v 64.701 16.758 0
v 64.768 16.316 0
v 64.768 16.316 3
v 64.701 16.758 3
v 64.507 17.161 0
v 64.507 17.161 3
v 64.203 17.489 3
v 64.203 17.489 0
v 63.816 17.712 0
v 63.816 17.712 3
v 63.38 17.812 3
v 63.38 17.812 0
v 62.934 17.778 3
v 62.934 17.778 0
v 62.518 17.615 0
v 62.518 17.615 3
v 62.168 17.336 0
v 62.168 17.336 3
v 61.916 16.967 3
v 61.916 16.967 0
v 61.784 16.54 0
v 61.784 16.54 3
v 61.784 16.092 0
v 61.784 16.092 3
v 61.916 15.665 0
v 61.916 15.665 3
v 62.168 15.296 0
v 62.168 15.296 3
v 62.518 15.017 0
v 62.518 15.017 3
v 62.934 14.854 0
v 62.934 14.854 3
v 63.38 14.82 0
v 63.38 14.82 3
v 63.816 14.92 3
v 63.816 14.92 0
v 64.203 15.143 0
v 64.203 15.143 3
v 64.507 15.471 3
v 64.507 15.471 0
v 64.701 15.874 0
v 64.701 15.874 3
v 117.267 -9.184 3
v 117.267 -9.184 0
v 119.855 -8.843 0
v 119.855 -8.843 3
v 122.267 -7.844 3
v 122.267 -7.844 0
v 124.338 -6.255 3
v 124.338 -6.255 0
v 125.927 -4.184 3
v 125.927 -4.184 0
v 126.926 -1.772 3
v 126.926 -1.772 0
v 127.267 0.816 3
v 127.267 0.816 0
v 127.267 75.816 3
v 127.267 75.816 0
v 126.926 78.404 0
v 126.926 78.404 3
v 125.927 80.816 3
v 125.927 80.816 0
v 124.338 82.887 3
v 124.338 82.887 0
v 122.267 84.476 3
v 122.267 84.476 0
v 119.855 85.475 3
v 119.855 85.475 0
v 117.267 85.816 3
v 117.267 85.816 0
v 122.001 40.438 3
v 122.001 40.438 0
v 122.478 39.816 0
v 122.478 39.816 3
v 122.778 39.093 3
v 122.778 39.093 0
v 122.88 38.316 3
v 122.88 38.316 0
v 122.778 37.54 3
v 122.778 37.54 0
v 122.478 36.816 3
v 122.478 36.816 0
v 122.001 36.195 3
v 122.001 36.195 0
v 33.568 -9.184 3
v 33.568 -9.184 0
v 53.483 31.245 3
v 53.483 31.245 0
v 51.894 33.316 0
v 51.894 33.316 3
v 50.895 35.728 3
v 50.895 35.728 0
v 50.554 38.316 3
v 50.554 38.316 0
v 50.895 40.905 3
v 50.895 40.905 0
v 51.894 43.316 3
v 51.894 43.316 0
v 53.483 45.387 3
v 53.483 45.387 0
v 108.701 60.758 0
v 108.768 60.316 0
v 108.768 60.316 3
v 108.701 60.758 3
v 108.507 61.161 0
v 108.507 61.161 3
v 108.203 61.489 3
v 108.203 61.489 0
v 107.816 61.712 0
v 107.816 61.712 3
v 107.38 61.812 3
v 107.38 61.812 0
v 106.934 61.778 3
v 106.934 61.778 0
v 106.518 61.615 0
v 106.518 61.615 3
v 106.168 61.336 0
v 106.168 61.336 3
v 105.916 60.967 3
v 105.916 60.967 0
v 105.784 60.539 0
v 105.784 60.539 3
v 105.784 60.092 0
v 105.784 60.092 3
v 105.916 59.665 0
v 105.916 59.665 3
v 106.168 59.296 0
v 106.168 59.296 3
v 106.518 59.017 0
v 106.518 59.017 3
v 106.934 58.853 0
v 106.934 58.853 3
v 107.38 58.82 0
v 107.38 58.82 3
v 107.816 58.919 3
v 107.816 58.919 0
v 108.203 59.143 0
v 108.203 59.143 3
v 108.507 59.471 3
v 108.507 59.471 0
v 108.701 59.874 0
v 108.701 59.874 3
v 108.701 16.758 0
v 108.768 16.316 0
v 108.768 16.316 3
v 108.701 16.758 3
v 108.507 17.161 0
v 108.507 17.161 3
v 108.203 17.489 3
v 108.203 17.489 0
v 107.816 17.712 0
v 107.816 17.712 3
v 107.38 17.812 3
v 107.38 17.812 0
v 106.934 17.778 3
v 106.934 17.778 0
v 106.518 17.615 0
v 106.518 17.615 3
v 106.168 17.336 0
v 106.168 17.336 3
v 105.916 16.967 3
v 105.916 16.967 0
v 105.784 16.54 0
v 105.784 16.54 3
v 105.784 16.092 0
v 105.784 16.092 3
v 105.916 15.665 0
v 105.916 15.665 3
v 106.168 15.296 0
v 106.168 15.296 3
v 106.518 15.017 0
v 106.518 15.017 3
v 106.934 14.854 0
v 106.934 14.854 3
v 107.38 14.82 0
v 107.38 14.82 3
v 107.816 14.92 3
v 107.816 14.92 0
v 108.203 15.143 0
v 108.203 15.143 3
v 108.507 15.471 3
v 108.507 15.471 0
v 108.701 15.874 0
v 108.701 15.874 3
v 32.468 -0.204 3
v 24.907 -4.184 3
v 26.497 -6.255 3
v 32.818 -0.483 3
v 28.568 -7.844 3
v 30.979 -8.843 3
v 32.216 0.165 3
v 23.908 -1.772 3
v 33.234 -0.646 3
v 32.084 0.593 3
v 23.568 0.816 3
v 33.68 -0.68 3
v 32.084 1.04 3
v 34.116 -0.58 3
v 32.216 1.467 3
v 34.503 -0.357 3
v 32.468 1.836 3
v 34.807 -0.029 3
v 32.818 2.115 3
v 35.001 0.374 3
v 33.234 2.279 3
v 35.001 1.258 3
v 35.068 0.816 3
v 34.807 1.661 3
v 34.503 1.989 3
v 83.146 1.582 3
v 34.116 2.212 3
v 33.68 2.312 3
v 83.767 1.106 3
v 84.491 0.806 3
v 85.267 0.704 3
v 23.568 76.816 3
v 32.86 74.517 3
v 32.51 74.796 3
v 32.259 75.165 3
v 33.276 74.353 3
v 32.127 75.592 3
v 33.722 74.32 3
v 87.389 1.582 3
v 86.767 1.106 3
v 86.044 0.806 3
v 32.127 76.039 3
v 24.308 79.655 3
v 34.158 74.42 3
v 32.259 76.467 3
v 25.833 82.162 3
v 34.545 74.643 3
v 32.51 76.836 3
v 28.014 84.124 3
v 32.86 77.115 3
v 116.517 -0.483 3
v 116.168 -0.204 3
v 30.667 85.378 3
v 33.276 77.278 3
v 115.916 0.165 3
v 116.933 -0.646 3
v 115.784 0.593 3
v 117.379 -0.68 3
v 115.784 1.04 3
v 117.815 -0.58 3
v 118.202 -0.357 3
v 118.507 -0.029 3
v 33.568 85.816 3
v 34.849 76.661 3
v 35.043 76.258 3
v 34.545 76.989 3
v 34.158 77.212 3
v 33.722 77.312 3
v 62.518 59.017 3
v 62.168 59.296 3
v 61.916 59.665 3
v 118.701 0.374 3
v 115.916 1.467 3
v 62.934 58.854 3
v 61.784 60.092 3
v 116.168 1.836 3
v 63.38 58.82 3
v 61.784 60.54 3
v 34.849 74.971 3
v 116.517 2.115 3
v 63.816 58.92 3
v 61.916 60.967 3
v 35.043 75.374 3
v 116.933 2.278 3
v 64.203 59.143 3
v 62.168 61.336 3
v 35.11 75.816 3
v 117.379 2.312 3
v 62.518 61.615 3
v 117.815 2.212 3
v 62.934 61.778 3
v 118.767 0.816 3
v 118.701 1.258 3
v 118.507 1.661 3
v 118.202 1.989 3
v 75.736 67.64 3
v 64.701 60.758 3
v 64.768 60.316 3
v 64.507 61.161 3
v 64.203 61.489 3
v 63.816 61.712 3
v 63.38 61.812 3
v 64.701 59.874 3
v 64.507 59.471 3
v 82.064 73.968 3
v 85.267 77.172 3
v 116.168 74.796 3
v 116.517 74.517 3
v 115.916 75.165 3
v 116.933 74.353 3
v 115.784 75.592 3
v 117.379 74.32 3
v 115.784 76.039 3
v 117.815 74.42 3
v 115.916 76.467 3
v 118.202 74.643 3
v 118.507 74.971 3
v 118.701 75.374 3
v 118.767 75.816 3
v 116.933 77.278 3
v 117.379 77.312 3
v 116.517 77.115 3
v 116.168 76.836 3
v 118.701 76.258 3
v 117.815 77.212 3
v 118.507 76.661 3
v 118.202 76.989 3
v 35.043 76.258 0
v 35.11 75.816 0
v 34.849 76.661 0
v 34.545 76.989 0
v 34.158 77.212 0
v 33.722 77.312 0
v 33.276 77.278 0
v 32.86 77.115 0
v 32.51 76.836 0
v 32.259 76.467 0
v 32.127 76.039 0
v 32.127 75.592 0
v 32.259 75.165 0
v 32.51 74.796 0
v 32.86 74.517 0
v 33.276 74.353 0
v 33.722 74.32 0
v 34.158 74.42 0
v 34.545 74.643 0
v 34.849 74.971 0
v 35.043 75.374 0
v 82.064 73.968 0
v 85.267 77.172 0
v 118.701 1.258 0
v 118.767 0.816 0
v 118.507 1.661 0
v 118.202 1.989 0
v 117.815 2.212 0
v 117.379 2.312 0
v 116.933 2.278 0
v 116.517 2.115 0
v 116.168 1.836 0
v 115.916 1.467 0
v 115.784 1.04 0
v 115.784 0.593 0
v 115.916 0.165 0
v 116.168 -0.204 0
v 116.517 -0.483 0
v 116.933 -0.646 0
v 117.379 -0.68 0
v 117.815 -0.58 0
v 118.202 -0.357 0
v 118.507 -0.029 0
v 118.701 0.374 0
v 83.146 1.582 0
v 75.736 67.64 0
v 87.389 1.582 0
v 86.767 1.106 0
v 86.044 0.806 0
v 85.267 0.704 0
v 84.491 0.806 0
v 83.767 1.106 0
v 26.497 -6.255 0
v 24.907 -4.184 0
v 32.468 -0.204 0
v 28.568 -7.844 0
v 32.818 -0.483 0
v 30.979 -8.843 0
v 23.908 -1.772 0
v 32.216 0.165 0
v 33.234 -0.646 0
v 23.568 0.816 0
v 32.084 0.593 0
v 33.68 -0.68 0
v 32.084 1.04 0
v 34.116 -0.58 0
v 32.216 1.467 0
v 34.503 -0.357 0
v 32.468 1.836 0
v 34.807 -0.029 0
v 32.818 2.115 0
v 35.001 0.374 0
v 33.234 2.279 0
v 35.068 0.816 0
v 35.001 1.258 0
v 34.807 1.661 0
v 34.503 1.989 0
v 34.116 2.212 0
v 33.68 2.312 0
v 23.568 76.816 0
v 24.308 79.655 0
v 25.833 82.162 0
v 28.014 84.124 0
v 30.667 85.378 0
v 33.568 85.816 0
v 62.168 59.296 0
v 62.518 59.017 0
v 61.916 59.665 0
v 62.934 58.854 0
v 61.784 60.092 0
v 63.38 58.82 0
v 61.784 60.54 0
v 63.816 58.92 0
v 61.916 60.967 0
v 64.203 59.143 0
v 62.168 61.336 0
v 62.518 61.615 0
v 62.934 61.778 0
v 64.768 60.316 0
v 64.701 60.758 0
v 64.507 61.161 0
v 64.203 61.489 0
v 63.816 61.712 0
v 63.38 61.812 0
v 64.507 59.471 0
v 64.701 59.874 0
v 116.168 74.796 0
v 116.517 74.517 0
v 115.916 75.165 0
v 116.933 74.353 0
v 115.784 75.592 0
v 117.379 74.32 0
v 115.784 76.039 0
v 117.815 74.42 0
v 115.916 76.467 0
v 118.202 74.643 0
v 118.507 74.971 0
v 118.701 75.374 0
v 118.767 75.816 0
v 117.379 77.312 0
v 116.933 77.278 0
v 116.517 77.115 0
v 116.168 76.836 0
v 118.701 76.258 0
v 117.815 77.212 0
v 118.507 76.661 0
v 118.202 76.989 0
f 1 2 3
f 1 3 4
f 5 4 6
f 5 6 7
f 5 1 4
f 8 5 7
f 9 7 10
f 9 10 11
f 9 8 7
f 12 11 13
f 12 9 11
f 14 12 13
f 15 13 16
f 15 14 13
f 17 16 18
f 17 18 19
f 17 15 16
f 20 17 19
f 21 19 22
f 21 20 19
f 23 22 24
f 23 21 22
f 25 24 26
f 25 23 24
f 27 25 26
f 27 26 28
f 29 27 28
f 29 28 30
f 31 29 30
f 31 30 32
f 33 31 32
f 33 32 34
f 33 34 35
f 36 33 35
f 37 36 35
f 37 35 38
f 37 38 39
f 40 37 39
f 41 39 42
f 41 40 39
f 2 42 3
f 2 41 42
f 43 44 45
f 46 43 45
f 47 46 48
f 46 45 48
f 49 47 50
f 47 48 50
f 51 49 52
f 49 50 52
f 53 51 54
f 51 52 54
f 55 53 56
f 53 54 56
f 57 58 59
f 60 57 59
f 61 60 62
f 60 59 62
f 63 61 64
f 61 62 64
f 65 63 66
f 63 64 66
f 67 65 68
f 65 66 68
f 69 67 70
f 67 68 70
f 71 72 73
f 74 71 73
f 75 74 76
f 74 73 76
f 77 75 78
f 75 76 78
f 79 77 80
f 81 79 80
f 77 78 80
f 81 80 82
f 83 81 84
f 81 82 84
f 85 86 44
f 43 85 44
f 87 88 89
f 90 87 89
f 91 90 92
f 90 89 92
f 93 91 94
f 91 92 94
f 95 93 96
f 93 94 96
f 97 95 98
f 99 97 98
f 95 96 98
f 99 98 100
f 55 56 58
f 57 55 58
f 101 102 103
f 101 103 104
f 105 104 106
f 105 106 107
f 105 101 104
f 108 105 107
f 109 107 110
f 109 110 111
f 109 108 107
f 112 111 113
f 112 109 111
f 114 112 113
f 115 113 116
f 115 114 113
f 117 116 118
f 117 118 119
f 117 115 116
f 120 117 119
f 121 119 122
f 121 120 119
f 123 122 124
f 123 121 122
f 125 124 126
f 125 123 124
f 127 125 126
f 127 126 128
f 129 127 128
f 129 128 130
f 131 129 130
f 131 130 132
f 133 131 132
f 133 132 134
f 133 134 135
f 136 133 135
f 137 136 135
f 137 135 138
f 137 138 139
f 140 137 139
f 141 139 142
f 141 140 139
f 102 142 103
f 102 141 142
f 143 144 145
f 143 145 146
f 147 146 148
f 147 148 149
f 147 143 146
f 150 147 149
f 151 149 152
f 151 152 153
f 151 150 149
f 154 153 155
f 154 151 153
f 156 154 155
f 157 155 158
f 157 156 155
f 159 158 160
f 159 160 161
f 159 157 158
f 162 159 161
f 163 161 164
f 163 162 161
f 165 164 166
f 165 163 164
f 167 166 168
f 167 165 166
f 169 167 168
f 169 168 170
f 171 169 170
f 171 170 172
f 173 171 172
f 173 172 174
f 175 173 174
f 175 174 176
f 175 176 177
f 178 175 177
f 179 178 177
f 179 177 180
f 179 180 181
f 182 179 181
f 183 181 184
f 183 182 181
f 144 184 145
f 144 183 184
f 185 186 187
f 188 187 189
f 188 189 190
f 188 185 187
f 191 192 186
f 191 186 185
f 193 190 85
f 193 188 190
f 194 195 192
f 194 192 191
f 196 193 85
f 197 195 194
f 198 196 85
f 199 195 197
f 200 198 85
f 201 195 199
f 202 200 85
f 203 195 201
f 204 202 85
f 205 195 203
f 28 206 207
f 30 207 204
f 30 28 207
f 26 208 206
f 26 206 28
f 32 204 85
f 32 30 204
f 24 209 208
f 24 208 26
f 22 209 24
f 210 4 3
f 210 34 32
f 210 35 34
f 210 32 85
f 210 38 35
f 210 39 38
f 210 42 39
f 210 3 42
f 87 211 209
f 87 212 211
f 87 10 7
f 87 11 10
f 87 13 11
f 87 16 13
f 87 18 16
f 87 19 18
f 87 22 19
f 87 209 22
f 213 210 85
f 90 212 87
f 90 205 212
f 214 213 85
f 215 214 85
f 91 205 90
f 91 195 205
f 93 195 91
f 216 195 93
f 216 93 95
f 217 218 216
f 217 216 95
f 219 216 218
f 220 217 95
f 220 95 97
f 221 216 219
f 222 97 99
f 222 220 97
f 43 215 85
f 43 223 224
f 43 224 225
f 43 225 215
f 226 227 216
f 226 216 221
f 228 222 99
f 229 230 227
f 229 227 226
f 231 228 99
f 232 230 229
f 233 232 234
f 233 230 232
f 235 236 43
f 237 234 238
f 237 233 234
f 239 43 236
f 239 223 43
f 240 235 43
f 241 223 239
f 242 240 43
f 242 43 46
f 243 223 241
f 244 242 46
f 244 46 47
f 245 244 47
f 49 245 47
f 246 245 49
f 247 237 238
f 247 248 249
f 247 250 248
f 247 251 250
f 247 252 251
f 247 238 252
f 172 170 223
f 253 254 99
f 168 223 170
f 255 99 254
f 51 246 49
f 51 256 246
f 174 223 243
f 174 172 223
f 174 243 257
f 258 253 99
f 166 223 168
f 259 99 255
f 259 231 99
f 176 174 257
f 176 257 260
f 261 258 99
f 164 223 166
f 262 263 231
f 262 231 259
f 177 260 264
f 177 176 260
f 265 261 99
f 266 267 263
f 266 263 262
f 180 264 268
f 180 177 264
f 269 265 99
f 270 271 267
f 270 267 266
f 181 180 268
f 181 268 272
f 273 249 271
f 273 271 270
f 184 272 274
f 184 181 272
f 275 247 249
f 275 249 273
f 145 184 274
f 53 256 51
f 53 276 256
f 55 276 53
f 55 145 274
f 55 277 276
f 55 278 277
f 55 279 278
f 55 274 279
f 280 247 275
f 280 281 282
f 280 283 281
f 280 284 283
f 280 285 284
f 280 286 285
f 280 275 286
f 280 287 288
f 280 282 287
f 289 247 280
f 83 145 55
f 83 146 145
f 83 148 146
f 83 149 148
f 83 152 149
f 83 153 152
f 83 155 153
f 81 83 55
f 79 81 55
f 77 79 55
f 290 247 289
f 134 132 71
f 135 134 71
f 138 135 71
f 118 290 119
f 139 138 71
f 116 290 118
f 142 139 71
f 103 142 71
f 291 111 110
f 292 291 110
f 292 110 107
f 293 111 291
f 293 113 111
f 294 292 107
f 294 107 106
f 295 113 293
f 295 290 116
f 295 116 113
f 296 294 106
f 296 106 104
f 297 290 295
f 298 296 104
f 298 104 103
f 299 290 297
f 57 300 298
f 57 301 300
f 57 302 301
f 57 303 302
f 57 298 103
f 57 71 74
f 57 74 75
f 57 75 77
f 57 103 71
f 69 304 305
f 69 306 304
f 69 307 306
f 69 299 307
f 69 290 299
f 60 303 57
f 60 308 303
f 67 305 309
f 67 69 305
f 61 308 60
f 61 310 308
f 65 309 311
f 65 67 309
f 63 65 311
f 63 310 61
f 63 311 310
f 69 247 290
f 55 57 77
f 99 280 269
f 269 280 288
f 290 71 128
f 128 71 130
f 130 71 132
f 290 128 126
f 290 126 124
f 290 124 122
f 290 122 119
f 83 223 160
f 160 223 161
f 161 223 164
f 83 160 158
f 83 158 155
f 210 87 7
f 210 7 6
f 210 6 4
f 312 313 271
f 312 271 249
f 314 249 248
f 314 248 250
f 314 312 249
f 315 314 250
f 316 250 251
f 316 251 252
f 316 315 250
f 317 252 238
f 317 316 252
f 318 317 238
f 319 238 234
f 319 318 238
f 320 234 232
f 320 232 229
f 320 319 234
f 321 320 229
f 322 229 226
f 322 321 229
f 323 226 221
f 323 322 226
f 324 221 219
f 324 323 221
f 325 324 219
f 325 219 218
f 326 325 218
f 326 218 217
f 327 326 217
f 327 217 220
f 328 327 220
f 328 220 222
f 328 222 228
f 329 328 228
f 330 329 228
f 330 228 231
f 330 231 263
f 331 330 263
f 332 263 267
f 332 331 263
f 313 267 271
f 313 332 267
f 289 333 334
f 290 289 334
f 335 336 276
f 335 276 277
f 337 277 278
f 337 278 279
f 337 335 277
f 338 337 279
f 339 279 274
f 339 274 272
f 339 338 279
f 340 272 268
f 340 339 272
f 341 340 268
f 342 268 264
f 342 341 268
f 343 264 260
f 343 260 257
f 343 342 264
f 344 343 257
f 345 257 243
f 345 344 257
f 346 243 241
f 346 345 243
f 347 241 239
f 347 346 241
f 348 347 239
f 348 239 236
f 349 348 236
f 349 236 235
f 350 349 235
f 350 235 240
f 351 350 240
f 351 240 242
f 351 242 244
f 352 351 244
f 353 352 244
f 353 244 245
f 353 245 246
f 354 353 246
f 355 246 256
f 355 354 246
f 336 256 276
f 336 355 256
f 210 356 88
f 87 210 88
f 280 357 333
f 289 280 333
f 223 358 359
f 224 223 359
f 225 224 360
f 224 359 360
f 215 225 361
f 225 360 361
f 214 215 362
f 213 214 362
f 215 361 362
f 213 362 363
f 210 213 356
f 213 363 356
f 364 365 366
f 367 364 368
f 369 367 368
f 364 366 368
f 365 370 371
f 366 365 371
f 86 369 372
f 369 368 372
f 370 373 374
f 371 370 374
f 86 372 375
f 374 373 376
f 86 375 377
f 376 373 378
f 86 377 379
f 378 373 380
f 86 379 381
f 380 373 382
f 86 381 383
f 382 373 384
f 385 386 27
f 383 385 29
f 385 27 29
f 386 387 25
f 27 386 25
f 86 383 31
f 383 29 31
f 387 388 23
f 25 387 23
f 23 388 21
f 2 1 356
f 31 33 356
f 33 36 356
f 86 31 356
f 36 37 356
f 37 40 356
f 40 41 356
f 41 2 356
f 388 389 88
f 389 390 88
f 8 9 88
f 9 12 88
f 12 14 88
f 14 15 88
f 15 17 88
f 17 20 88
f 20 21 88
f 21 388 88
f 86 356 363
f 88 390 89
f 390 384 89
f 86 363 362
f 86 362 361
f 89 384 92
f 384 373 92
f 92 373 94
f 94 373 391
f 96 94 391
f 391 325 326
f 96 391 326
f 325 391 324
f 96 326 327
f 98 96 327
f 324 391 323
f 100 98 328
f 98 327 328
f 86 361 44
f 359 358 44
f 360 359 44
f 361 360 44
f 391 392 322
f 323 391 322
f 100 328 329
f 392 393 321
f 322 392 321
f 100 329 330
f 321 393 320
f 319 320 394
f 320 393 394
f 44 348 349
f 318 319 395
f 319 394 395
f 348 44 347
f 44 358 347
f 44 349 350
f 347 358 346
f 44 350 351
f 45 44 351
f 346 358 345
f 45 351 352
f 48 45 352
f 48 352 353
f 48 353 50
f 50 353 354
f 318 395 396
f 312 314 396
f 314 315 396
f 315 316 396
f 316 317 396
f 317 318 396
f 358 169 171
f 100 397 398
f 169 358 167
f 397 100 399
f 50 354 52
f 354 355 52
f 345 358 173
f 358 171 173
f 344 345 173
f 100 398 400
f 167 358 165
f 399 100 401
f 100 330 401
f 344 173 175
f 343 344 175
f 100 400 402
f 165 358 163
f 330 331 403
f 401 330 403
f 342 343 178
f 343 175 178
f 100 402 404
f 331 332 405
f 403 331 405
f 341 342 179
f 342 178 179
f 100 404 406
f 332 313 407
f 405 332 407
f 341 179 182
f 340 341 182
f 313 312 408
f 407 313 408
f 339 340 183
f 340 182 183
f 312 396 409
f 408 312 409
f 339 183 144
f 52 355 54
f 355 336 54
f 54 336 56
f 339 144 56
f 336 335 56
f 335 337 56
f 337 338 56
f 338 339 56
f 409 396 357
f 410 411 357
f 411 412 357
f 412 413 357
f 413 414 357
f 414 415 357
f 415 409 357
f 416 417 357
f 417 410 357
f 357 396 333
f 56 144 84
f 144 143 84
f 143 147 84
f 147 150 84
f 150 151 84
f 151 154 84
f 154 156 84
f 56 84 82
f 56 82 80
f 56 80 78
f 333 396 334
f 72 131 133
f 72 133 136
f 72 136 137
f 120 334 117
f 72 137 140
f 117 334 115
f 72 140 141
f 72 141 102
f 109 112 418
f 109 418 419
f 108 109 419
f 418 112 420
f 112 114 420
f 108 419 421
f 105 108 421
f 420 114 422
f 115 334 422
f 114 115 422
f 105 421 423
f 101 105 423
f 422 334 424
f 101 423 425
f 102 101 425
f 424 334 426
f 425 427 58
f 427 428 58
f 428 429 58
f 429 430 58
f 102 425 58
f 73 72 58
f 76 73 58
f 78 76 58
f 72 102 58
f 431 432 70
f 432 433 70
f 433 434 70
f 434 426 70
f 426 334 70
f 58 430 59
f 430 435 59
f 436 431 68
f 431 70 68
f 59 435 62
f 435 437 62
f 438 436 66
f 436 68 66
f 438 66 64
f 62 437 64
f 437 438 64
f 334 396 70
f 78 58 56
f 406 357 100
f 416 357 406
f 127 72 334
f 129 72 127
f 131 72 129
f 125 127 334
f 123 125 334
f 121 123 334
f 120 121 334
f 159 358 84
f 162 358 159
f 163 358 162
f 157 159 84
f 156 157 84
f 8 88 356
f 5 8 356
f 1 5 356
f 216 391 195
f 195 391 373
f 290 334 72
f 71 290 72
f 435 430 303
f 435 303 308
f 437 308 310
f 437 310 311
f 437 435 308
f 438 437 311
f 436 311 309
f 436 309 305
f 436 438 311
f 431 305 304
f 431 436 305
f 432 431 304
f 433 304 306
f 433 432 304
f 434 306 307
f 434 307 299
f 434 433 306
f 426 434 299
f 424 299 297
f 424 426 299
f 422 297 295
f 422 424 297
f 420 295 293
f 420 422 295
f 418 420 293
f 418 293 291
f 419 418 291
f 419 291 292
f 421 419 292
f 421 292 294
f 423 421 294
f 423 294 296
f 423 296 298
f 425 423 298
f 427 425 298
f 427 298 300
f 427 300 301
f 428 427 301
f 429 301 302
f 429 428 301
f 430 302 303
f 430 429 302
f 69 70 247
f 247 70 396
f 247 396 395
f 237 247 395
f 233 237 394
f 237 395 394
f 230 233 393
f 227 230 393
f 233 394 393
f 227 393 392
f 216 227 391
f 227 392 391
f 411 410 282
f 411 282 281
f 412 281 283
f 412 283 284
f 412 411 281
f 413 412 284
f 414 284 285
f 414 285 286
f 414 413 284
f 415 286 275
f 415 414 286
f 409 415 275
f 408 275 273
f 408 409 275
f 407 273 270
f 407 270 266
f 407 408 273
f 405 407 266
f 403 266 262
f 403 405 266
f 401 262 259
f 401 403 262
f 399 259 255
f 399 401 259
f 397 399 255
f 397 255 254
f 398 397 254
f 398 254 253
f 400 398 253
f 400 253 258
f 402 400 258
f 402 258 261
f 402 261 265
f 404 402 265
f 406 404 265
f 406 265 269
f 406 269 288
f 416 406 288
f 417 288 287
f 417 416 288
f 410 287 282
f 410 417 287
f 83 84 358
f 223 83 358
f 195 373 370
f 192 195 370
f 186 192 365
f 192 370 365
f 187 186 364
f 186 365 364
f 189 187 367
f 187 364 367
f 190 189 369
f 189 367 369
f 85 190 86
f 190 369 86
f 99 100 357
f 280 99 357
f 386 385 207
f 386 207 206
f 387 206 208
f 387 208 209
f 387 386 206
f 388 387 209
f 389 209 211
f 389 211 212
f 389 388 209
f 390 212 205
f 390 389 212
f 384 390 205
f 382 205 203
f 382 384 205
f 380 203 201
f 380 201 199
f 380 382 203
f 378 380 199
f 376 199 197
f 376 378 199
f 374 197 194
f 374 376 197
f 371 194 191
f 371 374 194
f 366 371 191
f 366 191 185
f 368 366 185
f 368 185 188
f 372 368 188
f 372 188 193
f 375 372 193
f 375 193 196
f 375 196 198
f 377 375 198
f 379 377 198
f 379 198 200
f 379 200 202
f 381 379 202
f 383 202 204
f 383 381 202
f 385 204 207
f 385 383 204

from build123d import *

# Parameters (mm, degrees)
MODEL_R             = 1.499994887
BOSS_EXTRUDE1_DEPTH = 3


with BuildPart() as part:
    # Model → Boss-Extrude1 (new body)
    with BuildSketch(Plane.XY):
        with BuildLine():
            ThreePointArc((127.267167807, 75.815864008), (124.338313147, 82.886904548), (117.267301896, 85.815829919))
            Line((117.267301896, 85.815829919), (33.567587225, 85.815829919))
            ThreePointArc((33.567587225, 85.815829919), (26.851651545, 83.222459398), (23.567621314, 76.815860599))
            Line((23.567621314, 76.815860599), (23.567621314, 67.211322932))
            Line((23.567621314, 67.211322932), (23.567621314, 11.790716994))
            Line((23.567621314, 11.790716994), (23.567621314, 0.81611968))
            ThreePointArc((23.567621314, 0.81611968), (26.49658283, -6.254927716), (33.567648038, -9.183846231))
            Line((33.567648038, -9.183846231), (117.267301896, -9.183846231))
            ThreePointArc((117.267301896, -9.183846231), (124.338288146, -6.25489586), (127.267167807, 0.816119679))
            Line((127.267167807, 0.816119679), (127.267167807, 11.594182037))
            Line((127.267167807, 11.594182037), (127.267167807, 49.315954345))
            Line((127.267167807, 49.315954345), (127.267167807, 75.815864008))
        make_face()
        with Locations((33.567587225, 0.816119679)):
            Circle(MODEL_R, mode=Mode.SUBTRACT)
        with Locations((63.267605432, 16.315947389)):
            Circle(MODEL_R, mode=Mode.SUBTRACT)
        with Locations((117.267226438, 0.816095138)):
            Circle(MODEL_R, mode=Mode.SUBTRACT)
        with Locations((107.26755543, 16.315947389)):
            Circle(MODEL_R, mode=Mode.SUBTRACT)
        with Locations((63.267555431, 60.315947389)):
            Circle(MODEL_R, mode=Mode.SUBTRACT)
        with Locations((33.610039072, 75.815864008)):
            Circle(MODEL_R, mode=Mode.SUBTRACT)
        with BuildLine():
            Line((53.483284952, 45.387404724), (75.735868353, 67.640059648))
            Line((75.735868353, 67.640059648), (82.064163104, 73.968374739))
            Line((82.064163104, 73.968374739), (85.267424216, 77.171646146))
            Line((85.267424216, 77.171646146), (89.463558538, 72.975511824))
            Line((89.463558538, 72.975511824), (122.001384869, 40.437685493))
            ThreePointArc((122.001384869, 40.437685493), (122.88006153, 38.316372381), (122.001384869, 36.195059268))
            Line((122.001384869, 36.195059268), (87.388740737, 1.582415136))
            ThreePointArc((87.388740737, 1.582415136), (85.267425214, 0.703738475), (83.146111103, 1.582418545))
            Line((83.146111103, 1.582418545), (53.483284952, 31.245340037))
            ThreePointArc((53.483284952, 31.245340037), (50.554374112, 38.316372381), (53.483284952, 45.387404724))
        make_face(mode=Mode.SUBTRACT)
        with Locations((107.26755543, 60.315797391)):
            Circle(MODEL_R, mode=Mode.SUBTRACT)
        with Locations((117.267226438, 75.815864008)):
            Circle(MODEL_R, mode=Mode.SUBTRACT)
    extrude(amount=BOSS_EXTRUDE1_DEPTH)


solid = part.part
